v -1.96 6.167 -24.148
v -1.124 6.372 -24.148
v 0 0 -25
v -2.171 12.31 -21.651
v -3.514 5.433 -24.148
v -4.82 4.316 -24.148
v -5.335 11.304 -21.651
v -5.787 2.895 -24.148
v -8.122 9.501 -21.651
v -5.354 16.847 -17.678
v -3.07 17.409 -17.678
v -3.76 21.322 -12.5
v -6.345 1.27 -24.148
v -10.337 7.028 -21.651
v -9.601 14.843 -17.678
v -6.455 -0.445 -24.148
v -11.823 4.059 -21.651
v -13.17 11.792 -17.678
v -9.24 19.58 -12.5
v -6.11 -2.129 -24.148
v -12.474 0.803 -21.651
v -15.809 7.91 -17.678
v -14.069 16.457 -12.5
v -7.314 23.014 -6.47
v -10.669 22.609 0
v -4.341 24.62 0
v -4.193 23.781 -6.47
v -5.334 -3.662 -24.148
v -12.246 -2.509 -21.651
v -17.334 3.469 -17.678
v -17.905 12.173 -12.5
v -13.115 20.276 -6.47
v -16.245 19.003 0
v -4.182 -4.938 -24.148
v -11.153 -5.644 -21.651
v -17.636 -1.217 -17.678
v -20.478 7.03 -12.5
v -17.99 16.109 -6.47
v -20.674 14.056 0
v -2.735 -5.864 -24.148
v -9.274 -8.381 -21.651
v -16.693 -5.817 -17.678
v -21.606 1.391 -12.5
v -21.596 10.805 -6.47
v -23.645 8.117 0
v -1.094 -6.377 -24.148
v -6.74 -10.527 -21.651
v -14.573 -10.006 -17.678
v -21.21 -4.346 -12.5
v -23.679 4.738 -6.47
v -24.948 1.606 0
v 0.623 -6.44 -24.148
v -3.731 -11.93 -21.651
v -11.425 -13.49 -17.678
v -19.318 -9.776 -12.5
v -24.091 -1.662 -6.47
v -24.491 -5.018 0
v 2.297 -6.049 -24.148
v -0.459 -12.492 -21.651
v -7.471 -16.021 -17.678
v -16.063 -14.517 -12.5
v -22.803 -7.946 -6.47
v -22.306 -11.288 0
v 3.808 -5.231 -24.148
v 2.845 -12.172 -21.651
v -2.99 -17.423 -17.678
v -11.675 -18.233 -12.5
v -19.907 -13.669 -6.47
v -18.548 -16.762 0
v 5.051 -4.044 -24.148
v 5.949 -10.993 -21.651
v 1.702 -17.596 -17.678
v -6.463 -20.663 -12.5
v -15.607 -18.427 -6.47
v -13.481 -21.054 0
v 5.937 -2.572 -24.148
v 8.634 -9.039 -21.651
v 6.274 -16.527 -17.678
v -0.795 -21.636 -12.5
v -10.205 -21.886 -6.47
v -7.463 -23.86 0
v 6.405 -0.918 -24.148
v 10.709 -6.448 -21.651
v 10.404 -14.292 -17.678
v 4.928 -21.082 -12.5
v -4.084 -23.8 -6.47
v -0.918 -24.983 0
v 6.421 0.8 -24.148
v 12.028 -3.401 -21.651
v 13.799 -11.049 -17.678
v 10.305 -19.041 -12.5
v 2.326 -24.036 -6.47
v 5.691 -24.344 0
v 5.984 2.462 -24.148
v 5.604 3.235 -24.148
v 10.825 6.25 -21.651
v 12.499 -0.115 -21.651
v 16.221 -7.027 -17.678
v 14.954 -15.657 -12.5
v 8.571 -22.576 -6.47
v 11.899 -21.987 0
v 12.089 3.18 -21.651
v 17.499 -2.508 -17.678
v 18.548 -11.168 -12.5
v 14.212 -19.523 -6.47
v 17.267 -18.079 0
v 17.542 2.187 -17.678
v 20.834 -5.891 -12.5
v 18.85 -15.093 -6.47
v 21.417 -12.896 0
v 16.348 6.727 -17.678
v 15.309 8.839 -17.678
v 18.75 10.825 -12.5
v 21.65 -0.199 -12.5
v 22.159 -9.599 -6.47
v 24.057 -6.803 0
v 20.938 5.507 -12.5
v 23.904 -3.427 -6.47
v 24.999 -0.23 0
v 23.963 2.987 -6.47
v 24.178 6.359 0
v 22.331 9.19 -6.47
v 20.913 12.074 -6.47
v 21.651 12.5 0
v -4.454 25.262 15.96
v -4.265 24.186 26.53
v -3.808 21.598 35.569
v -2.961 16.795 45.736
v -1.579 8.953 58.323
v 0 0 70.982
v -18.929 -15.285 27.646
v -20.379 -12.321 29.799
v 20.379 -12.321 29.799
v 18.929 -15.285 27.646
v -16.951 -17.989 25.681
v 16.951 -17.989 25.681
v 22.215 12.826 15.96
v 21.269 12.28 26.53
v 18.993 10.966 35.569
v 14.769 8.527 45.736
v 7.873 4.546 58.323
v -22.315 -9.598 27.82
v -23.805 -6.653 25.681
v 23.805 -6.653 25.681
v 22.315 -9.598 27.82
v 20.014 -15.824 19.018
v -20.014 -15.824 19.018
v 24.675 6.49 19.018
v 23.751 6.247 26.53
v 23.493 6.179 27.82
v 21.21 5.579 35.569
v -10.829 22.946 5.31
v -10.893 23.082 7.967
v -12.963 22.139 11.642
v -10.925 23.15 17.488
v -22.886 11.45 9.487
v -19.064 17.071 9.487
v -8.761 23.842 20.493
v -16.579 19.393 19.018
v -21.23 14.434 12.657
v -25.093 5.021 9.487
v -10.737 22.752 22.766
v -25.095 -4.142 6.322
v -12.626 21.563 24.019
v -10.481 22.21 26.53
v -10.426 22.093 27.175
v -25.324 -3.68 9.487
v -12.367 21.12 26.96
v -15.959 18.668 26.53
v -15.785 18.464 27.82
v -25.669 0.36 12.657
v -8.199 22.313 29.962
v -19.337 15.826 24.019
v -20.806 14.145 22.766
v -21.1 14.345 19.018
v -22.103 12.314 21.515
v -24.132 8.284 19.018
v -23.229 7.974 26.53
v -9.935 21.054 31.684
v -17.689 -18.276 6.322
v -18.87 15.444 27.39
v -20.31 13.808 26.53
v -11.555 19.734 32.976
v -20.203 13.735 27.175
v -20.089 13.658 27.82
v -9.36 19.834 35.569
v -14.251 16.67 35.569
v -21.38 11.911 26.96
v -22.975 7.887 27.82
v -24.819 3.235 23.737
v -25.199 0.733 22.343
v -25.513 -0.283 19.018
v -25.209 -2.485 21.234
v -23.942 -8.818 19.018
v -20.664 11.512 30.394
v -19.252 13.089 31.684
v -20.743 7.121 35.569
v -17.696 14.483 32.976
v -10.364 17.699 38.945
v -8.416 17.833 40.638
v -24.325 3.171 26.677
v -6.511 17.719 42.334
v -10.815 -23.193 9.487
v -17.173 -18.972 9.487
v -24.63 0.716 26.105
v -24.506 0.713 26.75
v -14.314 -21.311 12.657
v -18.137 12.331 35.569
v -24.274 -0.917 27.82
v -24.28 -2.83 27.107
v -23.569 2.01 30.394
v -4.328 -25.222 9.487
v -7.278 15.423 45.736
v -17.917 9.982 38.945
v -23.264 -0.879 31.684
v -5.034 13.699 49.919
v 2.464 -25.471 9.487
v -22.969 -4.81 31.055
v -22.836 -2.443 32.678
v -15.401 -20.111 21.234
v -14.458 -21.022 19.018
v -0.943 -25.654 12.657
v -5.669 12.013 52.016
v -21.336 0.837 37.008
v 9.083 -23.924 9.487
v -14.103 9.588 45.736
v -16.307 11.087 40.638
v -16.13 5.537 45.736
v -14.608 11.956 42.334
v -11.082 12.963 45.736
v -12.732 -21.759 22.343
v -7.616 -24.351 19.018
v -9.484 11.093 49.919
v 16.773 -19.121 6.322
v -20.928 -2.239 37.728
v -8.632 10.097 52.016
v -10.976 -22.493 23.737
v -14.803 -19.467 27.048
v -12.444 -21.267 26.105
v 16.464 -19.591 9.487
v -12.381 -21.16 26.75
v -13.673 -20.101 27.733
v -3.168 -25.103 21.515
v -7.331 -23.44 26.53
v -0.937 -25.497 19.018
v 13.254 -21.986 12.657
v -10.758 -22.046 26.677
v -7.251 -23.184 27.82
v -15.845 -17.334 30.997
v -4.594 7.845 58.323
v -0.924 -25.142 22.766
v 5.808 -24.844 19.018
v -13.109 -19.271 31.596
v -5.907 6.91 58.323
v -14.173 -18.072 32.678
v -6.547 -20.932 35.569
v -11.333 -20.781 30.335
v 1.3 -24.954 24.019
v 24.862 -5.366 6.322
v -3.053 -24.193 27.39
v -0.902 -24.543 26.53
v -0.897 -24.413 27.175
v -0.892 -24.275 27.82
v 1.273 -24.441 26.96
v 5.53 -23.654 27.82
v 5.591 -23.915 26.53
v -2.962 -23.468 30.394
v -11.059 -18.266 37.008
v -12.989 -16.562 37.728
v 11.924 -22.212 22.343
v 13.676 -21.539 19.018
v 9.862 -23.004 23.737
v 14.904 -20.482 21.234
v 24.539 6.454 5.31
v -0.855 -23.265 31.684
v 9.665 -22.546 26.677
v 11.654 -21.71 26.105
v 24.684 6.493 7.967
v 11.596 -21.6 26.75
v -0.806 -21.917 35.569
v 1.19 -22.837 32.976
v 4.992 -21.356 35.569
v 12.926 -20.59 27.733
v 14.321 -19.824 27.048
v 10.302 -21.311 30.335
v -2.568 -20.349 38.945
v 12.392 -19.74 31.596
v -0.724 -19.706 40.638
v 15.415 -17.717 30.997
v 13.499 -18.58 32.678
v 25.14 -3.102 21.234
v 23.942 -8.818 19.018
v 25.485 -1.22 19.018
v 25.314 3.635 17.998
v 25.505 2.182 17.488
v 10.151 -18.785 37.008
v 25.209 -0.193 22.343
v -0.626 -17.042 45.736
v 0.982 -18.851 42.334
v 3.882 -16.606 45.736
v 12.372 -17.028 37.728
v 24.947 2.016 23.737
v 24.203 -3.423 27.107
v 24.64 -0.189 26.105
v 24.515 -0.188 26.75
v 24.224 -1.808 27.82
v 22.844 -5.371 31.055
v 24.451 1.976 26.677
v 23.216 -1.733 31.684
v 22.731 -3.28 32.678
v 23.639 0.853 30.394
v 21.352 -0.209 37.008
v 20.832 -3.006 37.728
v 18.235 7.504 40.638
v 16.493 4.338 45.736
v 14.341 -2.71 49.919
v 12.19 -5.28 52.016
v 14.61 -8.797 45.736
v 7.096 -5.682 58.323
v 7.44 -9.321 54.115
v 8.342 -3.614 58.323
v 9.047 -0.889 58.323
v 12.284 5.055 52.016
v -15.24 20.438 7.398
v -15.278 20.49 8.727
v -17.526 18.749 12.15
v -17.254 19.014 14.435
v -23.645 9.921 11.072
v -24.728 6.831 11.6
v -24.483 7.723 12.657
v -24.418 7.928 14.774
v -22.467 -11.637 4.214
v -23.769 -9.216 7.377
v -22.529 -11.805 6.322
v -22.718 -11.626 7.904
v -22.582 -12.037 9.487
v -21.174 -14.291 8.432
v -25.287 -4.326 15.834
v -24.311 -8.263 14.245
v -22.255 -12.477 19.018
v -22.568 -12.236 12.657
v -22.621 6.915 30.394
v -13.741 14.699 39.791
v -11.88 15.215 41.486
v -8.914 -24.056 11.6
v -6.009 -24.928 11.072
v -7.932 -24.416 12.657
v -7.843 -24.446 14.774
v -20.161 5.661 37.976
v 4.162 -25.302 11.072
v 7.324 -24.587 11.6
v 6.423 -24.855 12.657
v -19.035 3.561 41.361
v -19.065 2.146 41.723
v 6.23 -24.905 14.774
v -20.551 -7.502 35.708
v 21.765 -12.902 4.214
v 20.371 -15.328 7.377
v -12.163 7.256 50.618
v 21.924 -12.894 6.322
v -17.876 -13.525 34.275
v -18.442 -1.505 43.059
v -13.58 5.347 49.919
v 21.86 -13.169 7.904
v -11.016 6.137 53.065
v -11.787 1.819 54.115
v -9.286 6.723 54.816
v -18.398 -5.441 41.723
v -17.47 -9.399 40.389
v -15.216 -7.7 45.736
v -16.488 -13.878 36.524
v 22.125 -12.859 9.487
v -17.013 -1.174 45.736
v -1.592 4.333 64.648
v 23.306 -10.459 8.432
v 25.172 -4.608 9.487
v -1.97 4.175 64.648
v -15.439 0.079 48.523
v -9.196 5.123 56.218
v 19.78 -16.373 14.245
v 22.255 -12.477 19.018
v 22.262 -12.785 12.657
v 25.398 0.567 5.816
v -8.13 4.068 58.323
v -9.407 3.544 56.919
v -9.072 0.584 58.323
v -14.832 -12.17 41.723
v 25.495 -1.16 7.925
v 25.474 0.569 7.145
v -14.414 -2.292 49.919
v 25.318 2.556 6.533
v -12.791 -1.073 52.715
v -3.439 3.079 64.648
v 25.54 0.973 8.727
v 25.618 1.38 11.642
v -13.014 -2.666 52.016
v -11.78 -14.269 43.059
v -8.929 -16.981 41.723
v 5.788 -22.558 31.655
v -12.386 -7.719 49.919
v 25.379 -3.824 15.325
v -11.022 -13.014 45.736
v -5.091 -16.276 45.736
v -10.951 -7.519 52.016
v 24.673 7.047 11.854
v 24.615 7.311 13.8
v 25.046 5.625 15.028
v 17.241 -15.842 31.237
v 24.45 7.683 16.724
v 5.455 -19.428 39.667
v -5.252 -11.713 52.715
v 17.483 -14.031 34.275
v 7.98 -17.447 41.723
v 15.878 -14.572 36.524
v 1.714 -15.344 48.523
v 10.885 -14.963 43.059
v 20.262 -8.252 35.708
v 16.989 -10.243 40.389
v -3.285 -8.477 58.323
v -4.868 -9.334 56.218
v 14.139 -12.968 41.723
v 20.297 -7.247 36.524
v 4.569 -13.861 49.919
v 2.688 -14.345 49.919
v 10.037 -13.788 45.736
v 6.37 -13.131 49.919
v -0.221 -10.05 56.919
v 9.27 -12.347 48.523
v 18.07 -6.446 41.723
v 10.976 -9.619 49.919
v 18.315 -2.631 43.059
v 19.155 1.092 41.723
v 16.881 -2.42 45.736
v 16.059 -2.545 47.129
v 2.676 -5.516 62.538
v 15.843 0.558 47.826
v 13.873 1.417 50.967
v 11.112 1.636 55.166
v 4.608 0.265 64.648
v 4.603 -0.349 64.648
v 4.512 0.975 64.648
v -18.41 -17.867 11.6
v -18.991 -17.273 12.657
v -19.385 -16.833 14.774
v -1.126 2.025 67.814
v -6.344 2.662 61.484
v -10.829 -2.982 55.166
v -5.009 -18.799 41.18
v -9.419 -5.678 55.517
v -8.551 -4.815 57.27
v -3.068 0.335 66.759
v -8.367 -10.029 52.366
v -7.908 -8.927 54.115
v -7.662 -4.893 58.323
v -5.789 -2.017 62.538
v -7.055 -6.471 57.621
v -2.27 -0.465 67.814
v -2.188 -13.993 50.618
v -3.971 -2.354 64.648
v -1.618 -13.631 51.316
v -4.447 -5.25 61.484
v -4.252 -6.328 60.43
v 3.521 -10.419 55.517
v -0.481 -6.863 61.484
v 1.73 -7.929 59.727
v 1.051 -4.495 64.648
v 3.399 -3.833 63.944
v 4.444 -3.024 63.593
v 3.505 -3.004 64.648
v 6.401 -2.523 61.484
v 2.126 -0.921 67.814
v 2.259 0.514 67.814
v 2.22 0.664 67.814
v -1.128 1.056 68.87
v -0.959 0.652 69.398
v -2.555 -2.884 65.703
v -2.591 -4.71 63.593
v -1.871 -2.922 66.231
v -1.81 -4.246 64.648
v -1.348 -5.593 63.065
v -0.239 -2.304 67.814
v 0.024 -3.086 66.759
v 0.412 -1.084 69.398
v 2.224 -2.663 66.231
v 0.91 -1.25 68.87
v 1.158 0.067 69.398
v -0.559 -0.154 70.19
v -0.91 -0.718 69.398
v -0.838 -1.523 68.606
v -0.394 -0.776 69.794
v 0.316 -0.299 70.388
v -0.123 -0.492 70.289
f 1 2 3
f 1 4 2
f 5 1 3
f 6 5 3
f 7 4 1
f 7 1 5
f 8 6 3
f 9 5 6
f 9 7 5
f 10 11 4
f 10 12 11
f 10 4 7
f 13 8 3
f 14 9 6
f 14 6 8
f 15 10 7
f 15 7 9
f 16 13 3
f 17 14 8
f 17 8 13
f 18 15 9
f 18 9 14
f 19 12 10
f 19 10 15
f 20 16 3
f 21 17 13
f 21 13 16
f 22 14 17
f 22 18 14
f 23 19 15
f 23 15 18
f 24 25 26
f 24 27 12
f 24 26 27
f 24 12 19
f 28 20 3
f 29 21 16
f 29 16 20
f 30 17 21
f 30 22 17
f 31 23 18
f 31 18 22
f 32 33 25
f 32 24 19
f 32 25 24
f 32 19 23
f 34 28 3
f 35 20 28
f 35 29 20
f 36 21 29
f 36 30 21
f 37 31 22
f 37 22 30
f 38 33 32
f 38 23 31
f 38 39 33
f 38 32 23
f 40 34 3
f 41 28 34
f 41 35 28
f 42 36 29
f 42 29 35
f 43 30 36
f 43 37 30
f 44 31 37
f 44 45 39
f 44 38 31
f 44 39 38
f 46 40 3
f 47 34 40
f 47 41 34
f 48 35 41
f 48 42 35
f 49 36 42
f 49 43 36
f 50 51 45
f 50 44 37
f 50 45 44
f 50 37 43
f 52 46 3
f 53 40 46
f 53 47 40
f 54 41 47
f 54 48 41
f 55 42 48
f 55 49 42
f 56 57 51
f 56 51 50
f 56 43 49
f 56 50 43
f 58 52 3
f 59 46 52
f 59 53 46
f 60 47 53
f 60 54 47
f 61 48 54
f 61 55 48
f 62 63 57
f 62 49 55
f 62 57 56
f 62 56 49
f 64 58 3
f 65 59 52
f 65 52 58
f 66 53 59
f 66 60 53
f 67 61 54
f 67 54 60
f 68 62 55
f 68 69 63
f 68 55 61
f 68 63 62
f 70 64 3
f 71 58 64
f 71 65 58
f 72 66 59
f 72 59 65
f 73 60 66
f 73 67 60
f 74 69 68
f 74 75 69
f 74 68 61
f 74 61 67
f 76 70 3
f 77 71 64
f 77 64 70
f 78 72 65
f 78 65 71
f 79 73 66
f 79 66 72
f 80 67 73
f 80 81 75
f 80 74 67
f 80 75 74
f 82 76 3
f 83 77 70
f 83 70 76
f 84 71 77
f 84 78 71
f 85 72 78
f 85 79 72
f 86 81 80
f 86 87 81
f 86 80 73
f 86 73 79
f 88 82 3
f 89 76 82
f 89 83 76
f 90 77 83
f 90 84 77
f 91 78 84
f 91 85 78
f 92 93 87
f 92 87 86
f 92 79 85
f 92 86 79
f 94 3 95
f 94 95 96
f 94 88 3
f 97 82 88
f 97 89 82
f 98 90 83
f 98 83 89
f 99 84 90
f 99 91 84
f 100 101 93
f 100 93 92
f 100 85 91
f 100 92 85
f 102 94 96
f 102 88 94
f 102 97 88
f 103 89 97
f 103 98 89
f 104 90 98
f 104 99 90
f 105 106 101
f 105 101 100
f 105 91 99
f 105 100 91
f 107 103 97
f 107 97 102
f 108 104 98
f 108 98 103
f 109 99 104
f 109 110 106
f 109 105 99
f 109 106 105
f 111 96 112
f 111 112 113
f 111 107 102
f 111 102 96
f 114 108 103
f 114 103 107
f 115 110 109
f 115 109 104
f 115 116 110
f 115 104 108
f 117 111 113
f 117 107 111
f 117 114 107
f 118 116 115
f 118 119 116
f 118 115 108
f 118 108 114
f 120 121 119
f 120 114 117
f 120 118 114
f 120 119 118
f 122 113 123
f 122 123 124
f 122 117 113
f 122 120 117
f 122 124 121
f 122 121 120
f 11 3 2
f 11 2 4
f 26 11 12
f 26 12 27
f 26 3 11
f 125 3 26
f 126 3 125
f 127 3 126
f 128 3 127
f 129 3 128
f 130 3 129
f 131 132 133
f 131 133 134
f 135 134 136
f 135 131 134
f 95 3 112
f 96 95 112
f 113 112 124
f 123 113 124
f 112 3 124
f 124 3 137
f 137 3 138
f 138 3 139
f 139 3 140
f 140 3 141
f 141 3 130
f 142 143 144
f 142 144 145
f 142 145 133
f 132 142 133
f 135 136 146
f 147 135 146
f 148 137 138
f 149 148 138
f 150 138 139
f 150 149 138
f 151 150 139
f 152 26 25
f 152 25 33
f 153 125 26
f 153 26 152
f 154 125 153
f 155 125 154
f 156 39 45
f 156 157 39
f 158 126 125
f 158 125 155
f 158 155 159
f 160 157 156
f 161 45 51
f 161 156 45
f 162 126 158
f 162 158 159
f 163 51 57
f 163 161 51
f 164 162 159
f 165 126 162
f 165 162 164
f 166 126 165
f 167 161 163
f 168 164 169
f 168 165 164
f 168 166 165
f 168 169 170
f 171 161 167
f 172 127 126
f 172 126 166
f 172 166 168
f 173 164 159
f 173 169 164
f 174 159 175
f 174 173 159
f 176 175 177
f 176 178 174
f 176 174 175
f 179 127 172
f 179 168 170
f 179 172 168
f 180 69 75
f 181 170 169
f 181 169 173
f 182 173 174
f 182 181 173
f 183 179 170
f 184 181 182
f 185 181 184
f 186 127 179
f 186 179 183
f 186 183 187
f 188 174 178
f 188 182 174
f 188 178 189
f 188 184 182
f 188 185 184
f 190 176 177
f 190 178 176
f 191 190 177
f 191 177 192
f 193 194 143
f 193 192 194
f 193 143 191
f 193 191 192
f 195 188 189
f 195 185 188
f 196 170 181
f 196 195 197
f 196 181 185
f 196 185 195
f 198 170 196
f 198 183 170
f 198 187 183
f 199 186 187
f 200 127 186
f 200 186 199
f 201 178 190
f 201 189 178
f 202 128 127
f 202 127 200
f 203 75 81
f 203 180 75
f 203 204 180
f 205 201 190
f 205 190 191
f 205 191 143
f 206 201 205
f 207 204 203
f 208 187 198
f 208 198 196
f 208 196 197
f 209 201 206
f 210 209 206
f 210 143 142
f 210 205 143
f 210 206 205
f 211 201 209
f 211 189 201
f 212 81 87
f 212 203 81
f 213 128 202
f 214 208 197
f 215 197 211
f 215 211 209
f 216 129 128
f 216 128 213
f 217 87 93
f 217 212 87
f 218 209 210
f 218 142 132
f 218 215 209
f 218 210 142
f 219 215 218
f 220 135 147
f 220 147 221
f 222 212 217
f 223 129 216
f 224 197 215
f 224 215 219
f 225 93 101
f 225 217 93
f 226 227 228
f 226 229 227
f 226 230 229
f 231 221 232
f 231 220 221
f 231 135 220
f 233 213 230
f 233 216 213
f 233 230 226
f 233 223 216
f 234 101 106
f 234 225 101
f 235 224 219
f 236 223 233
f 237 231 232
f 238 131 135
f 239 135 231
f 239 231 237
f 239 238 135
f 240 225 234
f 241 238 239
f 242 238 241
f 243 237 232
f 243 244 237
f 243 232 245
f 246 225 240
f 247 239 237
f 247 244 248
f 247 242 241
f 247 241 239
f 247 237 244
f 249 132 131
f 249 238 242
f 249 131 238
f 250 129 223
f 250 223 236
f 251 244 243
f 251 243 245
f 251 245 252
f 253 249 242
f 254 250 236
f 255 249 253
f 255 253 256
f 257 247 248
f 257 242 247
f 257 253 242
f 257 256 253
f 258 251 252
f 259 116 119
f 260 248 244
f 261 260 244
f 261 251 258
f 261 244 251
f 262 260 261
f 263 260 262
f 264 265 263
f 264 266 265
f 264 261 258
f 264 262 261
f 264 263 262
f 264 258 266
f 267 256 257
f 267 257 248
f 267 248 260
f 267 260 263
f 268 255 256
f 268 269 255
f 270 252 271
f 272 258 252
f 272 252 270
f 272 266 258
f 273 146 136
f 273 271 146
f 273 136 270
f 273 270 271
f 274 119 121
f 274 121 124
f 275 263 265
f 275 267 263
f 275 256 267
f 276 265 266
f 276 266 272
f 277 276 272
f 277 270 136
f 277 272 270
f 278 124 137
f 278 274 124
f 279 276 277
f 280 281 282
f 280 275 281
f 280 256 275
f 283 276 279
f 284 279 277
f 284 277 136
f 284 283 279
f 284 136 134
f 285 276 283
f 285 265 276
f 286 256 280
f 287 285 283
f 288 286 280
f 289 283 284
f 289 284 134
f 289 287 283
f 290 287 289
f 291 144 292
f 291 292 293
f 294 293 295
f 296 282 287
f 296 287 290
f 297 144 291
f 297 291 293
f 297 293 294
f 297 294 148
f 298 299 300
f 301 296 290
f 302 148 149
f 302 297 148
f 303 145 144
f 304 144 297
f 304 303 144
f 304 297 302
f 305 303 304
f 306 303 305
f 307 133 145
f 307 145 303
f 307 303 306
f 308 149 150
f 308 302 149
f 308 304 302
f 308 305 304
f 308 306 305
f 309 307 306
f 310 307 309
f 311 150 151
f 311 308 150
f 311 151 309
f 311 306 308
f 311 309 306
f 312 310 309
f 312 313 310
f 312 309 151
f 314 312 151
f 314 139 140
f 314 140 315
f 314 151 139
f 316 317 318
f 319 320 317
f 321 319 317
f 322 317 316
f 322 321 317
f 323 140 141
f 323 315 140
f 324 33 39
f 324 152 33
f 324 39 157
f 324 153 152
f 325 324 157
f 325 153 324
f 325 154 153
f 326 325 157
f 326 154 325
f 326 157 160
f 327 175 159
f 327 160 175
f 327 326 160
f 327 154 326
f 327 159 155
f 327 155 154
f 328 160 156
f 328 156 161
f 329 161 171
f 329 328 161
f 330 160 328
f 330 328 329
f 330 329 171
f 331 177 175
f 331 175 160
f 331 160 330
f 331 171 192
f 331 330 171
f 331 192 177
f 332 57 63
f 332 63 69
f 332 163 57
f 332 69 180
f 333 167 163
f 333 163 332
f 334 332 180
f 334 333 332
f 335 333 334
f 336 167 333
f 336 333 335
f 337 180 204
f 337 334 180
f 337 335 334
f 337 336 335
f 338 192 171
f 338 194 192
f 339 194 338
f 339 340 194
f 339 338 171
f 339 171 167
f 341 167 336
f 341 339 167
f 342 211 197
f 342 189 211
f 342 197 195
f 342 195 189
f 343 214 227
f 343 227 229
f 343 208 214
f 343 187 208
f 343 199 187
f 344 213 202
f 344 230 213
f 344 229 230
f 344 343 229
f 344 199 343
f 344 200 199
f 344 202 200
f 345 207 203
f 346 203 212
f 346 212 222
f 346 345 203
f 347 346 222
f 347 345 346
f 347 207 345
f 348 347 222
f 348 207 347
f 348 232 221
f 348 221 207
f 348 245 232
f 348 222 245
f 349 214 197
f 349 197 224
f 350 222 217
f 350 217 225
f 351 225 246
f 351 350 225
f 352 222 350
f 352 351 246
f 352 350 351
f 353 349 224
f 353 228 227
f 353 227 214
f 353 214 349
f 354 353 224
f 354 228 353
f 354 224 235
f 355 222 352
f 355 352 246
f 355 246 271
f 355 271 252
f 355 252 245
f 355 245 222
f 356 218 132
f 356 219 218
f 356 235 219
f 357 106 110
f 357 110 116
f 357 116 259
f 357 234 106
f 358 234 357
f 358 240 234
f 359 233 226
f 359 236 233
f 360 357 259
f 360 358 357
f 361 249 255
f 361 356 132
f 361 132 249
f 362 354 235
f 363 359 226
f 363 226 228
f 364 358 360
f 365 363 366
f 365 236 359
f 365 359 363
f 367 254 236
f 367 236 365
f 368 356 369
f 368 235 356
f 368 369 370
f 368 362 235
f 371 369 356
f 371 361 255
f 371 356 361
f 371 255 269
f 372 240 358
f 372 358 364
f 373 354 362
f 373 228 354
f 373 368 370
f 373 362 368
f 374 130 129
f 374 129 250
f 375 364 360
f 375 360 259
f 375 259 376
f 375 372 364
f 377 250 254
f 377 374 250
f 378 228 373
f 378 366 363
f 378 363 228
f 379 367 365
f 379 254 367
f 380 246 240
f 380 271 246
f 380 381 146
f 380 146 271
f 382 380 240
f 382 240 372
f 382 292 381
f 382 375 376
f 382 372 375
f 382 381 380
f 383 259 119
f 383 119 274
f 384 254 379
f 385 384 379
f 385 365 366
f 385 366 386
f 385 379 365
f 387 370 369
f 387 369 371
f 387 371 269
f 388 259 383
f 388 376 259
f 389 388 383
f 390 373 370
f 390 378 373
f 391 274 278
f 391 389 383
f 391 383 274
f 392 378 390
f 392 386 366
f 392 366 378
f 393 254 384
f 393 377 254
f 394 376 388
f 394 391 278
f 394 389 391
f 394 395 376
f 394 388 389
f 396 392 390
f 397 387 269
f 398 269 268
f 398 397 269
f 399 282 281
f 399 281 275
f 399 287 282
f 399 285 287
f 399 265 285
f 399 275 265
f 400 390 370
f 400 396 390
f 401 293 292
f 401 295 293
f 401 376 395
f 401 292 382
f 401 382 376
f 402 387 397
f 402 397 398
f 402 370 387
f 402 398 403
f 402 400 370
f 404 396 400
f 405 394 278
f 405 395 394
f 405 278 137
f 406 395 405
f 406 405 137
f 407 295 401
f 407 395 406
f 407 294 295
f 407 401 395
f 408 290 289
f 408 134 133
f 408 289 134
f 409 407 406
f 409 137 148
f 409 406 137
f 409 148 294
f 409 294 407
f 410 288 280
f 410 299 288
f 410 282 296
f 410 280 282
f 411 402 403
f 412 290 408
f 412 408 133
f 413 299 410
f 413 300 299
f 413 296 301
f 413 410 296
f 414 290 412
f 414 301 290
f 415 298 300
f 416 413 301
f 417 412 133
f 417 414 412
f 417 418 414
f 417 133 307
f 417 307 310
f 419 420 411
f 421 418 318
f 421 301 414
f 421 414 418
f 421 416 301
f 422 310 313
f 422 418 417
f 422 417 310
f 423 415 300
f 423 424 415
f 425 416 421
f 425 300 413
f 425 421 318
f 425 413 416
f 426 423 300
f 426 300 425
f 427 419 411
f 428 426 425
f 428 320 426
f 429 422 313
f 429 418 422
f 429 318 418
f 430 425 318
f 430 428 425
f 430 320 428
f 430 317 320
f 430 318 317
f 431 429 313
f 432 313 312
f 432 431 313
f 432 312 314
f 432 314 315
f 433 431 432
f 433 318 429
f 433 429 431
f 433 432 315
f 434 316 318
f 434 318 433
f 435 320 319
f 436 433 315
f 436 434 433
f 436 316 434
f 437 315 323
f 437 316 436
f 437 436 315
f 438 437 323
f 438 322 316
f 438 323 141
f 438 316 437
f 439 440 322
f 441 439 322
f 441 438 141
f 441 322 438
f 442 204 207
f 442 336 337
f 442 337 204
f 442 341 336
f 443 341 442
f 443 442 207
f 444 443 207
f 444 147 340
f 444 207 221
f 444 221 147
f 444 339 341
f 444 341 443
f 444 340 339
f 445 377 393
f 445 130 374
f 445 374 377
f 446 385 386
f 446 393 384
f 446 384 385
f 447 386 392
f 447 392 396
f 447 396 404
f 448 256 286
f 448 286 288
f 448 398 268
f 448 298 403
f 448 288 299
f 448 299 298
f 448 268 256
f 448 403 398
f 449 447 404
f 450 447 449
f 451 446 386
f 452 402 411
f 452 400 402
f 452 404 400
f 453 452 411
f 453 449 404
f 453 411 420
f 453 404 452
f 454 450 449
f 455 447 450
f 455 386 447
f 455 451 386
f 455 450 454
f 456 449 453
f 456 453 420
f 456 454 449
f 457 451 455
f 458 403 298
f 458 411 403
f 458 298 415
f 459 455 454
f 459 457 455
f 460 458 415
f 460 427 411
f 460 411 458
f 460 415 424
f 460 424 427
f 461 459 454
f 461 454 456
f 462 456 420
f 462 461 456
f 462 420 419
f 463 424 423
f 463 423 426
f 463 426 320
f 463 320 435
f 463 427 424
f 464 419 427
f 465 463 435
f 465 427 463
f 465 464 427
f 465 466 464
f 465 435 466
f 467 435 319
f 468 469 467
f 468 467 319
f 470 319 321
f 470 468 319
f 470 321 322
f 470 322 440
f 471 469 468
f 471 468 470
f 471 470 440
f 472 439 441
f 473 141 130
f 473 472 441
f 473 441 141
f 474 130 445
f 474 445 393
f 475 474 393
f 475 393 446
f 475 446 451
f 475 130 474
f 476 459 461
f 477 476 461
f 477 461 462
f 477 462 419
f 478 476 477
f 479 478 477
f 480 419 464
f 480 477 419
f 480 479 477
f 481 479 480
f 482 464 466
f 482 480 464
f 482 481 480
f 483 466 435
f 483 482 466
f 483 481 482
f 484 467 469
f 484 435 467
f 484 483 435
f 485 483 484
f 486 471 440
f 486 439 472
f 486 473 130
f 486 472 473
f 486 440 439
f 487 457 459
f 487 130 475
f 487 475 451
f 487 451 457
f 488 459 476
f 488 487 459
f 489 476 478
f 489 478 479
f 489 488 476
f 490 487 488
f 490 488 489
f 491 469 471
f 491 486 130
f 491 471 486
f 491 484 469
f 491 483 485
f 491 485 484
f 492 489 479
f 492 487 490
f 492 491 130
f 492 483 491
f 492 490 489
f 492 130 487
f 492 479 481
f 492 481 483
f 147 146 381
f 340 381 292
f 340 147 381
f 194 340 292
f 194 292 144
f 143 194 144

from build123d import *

# Parameters (mm, degrees)
F1_ANGLE_BACK = 260
F1_ANGLE      = 290
F4_DEPTH      = 80


with BuildPart() as f1:
    # F0 (on Front) → F1 (revolve)
    with BuildSketch(Plane.XZ, mode=Mode.PRIVATE) as f1_sk:
        with BuildLine():
            Line((0, 70.9821507335), (0, 25))
            ThreePointArc((0, 25), (17.6776695297, 17.6776695297), (25, 0))
            add(Edge.make_bspline(
                [(25, 0), (25.7729905135, 10.449231781), (27.4753426857, 33.4615095623), (9.7026241041, 57.7321366539), (0, 70.9821507335)],
                knots=[0, 0, 0, 0, 0.4540720341, 1, 1, 1, 1], degree=3))
        make_face()
        with BuildLine():
            Line((0, 25), (0, -25))
            ThreePointArc((0, -25), (17.6776695297, -17.6776695297), (25, 0))
            ThreePointArc((25, 0), (17.6776695297, 17.6776695297), (0, 25))
        make_face()
    revolve(f1_sk.sketch.rotate(Axis((0, 0, 22.9910753667), (0, 0, 1)), -F1_ANGLE_BACK), axis=Axis((0, 0, 22.9910753667), (0, 0, 1)), revolution_arc=F1_ANGLE)

    # F3 (on offset) → F4 (cut)
    with BuildSketch(Plane.YZ.offset(-50)):
        Polygon((-15.8244016312, 19.0178565681), (-8.8184551604, 19.0178565681), (-6.6534986392, 25.680907612), (-12.3214283958, 29.7988996259), (-17.9893581524, 25.680907612), align=None)
    extrude(amount=F4_DEPTH, mode=Mode.SUBTRACT)


solid = f1.part
